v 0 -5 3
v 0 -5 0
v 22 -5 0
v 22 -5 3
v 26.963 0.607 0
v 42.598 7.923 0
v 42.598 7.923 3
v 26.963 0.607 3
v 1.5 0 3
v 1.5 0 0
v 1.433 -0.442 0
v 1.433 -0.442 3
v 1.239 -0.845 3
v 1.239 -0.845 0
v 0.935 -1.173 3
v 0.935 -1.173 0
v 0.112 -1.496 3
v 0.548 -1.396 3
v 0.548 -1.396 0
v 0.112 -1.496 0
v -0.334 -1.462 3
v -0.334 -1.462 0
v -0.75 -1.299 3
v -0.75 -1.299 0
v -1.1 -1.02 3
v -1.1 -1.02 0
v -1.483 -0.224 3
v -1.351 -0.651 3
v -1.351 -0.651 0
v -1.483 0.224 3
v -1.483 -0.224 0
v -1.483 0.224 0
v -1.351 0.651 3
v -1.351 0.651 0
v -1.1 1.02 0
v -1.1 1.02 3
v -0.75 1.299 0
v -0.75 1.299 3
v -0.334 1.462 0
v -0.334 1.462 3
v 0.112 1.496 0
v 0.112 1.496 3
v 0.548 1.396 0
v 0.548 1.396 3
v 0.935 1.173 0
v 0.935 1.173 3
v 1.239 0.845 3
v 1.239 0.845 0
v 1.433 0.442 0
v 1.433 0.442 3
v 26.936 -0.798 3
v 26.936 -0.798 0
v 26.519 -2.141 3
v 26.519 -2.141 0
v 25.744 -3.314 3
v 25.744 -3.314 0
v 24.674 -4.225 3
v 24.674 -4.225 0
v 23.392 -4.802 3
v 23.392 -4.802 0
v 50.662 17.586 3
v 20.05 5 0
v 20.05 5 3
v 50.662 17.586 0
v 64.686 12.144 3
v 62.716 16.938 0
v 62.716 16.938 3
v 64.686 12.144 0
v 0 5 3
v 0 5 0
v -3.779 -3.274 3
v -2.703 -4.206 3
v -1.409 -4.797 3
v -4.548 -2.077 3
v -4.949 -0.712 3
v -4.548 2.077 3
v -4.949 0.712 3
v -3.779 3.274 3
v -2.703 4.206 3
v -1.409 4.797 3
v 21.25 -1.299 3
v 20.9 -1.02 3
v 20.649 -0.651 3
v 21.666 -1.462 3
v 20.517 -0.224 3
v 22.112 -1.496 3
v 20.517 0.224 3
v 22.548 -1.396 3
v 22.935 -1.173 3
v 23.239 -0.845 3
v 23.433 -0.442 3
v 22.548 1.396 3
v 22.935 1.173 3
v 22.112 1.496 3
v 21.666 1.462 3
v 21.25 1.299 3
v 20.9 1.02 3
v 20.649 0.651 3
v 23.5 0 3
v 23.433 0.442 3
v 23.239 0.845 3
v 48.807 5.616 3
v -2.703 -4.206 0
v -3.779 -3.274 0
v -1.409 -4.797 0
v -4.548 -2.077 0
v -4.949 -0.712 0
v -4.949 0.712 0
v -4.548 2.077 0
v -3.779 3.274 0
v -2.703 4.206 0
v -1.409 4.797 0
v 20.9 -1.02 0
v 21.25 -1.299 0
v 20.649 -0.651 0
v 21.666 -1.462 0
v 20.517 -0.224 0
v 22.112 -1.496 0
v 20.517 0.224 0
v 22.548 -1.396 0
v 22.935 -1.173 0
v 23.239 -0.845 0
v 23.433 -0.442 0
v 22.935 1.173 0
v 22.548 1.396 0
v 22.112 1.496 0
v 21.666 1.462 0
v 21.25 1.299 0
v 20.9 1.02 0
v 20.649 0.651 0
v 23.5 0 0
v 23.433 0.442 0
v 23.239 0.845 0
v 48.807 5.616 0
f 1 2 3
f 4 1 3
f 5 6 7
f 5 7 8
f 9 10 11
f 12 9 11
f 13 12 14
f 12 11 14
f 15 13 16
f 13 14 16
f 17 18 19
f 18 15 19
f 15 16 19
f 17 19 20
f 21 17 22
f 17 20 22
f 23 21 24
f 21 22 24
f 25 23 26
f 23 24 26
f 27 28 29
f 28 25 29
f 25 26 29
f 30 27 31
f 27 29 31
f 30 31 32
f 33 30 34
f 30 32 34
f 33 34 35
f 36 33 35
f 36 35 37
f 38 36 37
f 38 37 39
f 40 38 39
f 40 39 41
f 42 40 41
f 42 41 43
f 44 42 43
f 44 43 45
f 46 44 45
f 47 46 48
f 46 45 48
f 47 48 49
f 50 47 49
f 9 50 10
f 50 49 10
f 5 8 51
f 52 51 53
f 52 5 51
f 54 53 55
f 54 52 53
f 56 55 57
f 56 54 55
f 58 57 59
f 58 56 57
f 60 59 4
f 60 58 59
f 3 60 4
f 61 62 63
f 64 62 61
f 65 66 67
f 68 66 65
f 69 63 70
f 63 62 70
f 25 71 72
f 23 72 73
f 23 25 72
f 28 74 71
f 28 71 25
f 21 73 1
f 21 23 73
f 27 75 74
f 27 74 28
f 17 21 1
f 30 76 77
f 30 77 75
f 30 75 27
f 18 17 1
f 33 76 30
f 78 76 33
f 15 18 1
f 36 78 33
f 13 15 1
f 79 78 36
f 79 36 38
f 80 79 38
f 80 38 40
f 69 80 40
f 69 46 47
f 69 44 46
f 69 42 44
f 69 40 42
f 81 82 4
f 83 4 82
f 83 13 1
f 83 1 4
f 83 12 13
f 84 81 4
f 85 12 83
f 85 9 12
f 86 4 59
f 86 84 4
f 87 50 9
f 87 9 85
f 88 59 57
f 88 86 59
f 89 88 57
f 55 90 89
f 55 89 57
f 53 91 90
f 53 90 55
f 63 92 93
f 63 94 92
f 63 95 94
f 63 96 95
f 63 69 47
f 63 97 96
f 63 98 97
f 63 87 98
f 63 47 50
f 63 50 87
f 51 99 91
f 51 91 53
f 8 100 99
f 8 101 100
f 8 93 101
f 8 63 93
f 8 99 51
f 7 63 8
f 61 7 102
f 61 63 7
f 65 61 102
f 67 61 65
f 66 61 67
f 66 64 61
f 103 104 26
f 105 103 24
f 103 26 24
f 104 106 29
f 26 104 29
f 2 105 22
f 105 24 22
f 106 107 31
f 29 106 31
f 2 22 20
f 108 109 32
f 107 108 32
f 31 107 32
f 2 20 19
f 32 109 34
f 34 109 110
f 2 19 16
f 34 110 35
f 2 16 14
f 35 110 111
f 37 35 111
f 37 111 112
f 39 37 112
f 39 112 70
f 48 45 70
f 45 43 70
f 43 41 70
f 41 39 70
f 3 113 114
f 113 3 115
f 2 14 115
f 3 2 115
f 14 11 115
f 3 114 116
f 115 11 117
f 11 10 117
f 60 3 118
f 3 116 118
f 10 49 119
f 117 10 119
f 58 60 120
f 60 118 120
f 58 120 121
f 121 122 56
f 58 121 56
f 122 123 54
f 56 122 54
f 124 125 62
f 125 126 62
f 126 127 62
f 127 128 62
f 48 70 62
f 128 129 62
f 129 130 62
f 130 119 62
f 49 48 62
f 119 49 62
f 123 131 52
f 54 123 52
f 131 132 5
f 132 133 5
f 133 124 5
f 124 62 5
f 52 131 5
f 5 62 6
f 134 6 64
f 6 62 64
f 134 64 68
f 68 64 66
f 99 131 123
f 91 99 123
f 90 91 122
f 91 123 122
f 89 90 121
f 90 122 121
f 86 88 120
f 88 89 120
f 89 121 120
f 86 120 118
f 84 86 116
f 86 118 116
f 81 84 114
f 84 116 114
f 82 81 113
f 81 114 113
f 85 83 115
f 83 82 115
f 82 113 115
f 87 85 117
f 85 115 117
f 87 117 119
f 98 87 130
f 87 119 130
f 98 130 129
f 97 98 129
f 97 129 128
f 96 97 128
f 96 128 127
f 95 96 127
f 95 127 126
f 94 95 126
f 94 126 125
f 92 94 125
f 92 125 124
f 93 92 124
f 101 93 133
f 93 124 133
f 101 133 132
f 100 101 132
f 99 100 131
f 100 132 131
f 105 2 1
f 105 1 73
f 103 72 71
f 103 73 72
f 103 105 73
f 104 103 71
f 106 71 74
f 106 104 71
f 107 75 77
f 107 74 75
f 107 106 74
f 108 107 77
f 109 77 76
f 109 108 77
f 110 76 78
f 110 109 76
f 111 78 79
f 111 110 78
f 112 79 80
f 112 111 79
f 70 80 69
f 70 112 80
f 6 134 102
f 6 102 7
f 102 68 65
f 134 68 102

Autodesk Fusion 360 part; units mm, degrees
sketch "Sketch1" plane through (0, 0, 0) normal (0, 0, 1) x (1, 0, 0)
  line L0 (0, -5) -> (22, -5)
  arc A0 (22, -5) -> (22, 5) centre (22, 0) ccw
  line L1 (22, 5) -> (0, 5)
  arc A1 (0, 5) -> (0, -5) centre (0, 0) ccw
  line L2 (0, 0) -> (22, 0) construction
  circle A2 centre (0, 0) radius 1.5
  line L3 (20.05, 5) -> (60.7446, 21.7316)
  line L4 (60.7446, 21.7316) -> (64.6864, 12.1444)
  line L5 (64.6864, 12.1444) -> (23.9013, -4.6244)
  line L6 (50.6615, 17.5859) -> (62.7155, 16.938)
  line L7 (48.8067, 5.6155) -> (42.5976, 7.9233)
  line L8 (42.5976, 7.9233) -> (26.963, 0.6072)
  circle A3 centre (22, 0) radius 1.5
  dimension "d1" = 22
  dimension "d2" = 5
  dimension "d3" = 3
  dimension "d4" = 157.65
  dimension "d5" = 44
  dimension "d6" = 1.95
  dimension "d7" = 3
extrude "Extrude1" add sketch "Sketch1" along normal blind 3 contours L0 A0 L1 A1 | A0 L1 L3 L4 L5 L6 L7 L8
sketch "Sketch2" plane through (0, 0, 0) normal (0, 0, 1) x (1, 0, 0)
  circle A0 centre (14, 12) radius 3.5
  circle A1 centre (14, 12) radius 1.5
  circle A2 centre (45, 12) radius 1.5
  circle A3 centre (45, 12) radius 3.5
  line L0 (14, 12) -> (45, 12)
  line L1 (17.1623, 13.5) -> (41.8377, 13.5)
  line L2 (17.1623, 10.5) -> (41.8377, 10.5)
  dimension "d10" = 3
  dimension "d11" = 3
  dimension "d12" = 7
  dimension "d13" = 7
  dimension "d14" = 31
  dimension "d15" = 1.5
